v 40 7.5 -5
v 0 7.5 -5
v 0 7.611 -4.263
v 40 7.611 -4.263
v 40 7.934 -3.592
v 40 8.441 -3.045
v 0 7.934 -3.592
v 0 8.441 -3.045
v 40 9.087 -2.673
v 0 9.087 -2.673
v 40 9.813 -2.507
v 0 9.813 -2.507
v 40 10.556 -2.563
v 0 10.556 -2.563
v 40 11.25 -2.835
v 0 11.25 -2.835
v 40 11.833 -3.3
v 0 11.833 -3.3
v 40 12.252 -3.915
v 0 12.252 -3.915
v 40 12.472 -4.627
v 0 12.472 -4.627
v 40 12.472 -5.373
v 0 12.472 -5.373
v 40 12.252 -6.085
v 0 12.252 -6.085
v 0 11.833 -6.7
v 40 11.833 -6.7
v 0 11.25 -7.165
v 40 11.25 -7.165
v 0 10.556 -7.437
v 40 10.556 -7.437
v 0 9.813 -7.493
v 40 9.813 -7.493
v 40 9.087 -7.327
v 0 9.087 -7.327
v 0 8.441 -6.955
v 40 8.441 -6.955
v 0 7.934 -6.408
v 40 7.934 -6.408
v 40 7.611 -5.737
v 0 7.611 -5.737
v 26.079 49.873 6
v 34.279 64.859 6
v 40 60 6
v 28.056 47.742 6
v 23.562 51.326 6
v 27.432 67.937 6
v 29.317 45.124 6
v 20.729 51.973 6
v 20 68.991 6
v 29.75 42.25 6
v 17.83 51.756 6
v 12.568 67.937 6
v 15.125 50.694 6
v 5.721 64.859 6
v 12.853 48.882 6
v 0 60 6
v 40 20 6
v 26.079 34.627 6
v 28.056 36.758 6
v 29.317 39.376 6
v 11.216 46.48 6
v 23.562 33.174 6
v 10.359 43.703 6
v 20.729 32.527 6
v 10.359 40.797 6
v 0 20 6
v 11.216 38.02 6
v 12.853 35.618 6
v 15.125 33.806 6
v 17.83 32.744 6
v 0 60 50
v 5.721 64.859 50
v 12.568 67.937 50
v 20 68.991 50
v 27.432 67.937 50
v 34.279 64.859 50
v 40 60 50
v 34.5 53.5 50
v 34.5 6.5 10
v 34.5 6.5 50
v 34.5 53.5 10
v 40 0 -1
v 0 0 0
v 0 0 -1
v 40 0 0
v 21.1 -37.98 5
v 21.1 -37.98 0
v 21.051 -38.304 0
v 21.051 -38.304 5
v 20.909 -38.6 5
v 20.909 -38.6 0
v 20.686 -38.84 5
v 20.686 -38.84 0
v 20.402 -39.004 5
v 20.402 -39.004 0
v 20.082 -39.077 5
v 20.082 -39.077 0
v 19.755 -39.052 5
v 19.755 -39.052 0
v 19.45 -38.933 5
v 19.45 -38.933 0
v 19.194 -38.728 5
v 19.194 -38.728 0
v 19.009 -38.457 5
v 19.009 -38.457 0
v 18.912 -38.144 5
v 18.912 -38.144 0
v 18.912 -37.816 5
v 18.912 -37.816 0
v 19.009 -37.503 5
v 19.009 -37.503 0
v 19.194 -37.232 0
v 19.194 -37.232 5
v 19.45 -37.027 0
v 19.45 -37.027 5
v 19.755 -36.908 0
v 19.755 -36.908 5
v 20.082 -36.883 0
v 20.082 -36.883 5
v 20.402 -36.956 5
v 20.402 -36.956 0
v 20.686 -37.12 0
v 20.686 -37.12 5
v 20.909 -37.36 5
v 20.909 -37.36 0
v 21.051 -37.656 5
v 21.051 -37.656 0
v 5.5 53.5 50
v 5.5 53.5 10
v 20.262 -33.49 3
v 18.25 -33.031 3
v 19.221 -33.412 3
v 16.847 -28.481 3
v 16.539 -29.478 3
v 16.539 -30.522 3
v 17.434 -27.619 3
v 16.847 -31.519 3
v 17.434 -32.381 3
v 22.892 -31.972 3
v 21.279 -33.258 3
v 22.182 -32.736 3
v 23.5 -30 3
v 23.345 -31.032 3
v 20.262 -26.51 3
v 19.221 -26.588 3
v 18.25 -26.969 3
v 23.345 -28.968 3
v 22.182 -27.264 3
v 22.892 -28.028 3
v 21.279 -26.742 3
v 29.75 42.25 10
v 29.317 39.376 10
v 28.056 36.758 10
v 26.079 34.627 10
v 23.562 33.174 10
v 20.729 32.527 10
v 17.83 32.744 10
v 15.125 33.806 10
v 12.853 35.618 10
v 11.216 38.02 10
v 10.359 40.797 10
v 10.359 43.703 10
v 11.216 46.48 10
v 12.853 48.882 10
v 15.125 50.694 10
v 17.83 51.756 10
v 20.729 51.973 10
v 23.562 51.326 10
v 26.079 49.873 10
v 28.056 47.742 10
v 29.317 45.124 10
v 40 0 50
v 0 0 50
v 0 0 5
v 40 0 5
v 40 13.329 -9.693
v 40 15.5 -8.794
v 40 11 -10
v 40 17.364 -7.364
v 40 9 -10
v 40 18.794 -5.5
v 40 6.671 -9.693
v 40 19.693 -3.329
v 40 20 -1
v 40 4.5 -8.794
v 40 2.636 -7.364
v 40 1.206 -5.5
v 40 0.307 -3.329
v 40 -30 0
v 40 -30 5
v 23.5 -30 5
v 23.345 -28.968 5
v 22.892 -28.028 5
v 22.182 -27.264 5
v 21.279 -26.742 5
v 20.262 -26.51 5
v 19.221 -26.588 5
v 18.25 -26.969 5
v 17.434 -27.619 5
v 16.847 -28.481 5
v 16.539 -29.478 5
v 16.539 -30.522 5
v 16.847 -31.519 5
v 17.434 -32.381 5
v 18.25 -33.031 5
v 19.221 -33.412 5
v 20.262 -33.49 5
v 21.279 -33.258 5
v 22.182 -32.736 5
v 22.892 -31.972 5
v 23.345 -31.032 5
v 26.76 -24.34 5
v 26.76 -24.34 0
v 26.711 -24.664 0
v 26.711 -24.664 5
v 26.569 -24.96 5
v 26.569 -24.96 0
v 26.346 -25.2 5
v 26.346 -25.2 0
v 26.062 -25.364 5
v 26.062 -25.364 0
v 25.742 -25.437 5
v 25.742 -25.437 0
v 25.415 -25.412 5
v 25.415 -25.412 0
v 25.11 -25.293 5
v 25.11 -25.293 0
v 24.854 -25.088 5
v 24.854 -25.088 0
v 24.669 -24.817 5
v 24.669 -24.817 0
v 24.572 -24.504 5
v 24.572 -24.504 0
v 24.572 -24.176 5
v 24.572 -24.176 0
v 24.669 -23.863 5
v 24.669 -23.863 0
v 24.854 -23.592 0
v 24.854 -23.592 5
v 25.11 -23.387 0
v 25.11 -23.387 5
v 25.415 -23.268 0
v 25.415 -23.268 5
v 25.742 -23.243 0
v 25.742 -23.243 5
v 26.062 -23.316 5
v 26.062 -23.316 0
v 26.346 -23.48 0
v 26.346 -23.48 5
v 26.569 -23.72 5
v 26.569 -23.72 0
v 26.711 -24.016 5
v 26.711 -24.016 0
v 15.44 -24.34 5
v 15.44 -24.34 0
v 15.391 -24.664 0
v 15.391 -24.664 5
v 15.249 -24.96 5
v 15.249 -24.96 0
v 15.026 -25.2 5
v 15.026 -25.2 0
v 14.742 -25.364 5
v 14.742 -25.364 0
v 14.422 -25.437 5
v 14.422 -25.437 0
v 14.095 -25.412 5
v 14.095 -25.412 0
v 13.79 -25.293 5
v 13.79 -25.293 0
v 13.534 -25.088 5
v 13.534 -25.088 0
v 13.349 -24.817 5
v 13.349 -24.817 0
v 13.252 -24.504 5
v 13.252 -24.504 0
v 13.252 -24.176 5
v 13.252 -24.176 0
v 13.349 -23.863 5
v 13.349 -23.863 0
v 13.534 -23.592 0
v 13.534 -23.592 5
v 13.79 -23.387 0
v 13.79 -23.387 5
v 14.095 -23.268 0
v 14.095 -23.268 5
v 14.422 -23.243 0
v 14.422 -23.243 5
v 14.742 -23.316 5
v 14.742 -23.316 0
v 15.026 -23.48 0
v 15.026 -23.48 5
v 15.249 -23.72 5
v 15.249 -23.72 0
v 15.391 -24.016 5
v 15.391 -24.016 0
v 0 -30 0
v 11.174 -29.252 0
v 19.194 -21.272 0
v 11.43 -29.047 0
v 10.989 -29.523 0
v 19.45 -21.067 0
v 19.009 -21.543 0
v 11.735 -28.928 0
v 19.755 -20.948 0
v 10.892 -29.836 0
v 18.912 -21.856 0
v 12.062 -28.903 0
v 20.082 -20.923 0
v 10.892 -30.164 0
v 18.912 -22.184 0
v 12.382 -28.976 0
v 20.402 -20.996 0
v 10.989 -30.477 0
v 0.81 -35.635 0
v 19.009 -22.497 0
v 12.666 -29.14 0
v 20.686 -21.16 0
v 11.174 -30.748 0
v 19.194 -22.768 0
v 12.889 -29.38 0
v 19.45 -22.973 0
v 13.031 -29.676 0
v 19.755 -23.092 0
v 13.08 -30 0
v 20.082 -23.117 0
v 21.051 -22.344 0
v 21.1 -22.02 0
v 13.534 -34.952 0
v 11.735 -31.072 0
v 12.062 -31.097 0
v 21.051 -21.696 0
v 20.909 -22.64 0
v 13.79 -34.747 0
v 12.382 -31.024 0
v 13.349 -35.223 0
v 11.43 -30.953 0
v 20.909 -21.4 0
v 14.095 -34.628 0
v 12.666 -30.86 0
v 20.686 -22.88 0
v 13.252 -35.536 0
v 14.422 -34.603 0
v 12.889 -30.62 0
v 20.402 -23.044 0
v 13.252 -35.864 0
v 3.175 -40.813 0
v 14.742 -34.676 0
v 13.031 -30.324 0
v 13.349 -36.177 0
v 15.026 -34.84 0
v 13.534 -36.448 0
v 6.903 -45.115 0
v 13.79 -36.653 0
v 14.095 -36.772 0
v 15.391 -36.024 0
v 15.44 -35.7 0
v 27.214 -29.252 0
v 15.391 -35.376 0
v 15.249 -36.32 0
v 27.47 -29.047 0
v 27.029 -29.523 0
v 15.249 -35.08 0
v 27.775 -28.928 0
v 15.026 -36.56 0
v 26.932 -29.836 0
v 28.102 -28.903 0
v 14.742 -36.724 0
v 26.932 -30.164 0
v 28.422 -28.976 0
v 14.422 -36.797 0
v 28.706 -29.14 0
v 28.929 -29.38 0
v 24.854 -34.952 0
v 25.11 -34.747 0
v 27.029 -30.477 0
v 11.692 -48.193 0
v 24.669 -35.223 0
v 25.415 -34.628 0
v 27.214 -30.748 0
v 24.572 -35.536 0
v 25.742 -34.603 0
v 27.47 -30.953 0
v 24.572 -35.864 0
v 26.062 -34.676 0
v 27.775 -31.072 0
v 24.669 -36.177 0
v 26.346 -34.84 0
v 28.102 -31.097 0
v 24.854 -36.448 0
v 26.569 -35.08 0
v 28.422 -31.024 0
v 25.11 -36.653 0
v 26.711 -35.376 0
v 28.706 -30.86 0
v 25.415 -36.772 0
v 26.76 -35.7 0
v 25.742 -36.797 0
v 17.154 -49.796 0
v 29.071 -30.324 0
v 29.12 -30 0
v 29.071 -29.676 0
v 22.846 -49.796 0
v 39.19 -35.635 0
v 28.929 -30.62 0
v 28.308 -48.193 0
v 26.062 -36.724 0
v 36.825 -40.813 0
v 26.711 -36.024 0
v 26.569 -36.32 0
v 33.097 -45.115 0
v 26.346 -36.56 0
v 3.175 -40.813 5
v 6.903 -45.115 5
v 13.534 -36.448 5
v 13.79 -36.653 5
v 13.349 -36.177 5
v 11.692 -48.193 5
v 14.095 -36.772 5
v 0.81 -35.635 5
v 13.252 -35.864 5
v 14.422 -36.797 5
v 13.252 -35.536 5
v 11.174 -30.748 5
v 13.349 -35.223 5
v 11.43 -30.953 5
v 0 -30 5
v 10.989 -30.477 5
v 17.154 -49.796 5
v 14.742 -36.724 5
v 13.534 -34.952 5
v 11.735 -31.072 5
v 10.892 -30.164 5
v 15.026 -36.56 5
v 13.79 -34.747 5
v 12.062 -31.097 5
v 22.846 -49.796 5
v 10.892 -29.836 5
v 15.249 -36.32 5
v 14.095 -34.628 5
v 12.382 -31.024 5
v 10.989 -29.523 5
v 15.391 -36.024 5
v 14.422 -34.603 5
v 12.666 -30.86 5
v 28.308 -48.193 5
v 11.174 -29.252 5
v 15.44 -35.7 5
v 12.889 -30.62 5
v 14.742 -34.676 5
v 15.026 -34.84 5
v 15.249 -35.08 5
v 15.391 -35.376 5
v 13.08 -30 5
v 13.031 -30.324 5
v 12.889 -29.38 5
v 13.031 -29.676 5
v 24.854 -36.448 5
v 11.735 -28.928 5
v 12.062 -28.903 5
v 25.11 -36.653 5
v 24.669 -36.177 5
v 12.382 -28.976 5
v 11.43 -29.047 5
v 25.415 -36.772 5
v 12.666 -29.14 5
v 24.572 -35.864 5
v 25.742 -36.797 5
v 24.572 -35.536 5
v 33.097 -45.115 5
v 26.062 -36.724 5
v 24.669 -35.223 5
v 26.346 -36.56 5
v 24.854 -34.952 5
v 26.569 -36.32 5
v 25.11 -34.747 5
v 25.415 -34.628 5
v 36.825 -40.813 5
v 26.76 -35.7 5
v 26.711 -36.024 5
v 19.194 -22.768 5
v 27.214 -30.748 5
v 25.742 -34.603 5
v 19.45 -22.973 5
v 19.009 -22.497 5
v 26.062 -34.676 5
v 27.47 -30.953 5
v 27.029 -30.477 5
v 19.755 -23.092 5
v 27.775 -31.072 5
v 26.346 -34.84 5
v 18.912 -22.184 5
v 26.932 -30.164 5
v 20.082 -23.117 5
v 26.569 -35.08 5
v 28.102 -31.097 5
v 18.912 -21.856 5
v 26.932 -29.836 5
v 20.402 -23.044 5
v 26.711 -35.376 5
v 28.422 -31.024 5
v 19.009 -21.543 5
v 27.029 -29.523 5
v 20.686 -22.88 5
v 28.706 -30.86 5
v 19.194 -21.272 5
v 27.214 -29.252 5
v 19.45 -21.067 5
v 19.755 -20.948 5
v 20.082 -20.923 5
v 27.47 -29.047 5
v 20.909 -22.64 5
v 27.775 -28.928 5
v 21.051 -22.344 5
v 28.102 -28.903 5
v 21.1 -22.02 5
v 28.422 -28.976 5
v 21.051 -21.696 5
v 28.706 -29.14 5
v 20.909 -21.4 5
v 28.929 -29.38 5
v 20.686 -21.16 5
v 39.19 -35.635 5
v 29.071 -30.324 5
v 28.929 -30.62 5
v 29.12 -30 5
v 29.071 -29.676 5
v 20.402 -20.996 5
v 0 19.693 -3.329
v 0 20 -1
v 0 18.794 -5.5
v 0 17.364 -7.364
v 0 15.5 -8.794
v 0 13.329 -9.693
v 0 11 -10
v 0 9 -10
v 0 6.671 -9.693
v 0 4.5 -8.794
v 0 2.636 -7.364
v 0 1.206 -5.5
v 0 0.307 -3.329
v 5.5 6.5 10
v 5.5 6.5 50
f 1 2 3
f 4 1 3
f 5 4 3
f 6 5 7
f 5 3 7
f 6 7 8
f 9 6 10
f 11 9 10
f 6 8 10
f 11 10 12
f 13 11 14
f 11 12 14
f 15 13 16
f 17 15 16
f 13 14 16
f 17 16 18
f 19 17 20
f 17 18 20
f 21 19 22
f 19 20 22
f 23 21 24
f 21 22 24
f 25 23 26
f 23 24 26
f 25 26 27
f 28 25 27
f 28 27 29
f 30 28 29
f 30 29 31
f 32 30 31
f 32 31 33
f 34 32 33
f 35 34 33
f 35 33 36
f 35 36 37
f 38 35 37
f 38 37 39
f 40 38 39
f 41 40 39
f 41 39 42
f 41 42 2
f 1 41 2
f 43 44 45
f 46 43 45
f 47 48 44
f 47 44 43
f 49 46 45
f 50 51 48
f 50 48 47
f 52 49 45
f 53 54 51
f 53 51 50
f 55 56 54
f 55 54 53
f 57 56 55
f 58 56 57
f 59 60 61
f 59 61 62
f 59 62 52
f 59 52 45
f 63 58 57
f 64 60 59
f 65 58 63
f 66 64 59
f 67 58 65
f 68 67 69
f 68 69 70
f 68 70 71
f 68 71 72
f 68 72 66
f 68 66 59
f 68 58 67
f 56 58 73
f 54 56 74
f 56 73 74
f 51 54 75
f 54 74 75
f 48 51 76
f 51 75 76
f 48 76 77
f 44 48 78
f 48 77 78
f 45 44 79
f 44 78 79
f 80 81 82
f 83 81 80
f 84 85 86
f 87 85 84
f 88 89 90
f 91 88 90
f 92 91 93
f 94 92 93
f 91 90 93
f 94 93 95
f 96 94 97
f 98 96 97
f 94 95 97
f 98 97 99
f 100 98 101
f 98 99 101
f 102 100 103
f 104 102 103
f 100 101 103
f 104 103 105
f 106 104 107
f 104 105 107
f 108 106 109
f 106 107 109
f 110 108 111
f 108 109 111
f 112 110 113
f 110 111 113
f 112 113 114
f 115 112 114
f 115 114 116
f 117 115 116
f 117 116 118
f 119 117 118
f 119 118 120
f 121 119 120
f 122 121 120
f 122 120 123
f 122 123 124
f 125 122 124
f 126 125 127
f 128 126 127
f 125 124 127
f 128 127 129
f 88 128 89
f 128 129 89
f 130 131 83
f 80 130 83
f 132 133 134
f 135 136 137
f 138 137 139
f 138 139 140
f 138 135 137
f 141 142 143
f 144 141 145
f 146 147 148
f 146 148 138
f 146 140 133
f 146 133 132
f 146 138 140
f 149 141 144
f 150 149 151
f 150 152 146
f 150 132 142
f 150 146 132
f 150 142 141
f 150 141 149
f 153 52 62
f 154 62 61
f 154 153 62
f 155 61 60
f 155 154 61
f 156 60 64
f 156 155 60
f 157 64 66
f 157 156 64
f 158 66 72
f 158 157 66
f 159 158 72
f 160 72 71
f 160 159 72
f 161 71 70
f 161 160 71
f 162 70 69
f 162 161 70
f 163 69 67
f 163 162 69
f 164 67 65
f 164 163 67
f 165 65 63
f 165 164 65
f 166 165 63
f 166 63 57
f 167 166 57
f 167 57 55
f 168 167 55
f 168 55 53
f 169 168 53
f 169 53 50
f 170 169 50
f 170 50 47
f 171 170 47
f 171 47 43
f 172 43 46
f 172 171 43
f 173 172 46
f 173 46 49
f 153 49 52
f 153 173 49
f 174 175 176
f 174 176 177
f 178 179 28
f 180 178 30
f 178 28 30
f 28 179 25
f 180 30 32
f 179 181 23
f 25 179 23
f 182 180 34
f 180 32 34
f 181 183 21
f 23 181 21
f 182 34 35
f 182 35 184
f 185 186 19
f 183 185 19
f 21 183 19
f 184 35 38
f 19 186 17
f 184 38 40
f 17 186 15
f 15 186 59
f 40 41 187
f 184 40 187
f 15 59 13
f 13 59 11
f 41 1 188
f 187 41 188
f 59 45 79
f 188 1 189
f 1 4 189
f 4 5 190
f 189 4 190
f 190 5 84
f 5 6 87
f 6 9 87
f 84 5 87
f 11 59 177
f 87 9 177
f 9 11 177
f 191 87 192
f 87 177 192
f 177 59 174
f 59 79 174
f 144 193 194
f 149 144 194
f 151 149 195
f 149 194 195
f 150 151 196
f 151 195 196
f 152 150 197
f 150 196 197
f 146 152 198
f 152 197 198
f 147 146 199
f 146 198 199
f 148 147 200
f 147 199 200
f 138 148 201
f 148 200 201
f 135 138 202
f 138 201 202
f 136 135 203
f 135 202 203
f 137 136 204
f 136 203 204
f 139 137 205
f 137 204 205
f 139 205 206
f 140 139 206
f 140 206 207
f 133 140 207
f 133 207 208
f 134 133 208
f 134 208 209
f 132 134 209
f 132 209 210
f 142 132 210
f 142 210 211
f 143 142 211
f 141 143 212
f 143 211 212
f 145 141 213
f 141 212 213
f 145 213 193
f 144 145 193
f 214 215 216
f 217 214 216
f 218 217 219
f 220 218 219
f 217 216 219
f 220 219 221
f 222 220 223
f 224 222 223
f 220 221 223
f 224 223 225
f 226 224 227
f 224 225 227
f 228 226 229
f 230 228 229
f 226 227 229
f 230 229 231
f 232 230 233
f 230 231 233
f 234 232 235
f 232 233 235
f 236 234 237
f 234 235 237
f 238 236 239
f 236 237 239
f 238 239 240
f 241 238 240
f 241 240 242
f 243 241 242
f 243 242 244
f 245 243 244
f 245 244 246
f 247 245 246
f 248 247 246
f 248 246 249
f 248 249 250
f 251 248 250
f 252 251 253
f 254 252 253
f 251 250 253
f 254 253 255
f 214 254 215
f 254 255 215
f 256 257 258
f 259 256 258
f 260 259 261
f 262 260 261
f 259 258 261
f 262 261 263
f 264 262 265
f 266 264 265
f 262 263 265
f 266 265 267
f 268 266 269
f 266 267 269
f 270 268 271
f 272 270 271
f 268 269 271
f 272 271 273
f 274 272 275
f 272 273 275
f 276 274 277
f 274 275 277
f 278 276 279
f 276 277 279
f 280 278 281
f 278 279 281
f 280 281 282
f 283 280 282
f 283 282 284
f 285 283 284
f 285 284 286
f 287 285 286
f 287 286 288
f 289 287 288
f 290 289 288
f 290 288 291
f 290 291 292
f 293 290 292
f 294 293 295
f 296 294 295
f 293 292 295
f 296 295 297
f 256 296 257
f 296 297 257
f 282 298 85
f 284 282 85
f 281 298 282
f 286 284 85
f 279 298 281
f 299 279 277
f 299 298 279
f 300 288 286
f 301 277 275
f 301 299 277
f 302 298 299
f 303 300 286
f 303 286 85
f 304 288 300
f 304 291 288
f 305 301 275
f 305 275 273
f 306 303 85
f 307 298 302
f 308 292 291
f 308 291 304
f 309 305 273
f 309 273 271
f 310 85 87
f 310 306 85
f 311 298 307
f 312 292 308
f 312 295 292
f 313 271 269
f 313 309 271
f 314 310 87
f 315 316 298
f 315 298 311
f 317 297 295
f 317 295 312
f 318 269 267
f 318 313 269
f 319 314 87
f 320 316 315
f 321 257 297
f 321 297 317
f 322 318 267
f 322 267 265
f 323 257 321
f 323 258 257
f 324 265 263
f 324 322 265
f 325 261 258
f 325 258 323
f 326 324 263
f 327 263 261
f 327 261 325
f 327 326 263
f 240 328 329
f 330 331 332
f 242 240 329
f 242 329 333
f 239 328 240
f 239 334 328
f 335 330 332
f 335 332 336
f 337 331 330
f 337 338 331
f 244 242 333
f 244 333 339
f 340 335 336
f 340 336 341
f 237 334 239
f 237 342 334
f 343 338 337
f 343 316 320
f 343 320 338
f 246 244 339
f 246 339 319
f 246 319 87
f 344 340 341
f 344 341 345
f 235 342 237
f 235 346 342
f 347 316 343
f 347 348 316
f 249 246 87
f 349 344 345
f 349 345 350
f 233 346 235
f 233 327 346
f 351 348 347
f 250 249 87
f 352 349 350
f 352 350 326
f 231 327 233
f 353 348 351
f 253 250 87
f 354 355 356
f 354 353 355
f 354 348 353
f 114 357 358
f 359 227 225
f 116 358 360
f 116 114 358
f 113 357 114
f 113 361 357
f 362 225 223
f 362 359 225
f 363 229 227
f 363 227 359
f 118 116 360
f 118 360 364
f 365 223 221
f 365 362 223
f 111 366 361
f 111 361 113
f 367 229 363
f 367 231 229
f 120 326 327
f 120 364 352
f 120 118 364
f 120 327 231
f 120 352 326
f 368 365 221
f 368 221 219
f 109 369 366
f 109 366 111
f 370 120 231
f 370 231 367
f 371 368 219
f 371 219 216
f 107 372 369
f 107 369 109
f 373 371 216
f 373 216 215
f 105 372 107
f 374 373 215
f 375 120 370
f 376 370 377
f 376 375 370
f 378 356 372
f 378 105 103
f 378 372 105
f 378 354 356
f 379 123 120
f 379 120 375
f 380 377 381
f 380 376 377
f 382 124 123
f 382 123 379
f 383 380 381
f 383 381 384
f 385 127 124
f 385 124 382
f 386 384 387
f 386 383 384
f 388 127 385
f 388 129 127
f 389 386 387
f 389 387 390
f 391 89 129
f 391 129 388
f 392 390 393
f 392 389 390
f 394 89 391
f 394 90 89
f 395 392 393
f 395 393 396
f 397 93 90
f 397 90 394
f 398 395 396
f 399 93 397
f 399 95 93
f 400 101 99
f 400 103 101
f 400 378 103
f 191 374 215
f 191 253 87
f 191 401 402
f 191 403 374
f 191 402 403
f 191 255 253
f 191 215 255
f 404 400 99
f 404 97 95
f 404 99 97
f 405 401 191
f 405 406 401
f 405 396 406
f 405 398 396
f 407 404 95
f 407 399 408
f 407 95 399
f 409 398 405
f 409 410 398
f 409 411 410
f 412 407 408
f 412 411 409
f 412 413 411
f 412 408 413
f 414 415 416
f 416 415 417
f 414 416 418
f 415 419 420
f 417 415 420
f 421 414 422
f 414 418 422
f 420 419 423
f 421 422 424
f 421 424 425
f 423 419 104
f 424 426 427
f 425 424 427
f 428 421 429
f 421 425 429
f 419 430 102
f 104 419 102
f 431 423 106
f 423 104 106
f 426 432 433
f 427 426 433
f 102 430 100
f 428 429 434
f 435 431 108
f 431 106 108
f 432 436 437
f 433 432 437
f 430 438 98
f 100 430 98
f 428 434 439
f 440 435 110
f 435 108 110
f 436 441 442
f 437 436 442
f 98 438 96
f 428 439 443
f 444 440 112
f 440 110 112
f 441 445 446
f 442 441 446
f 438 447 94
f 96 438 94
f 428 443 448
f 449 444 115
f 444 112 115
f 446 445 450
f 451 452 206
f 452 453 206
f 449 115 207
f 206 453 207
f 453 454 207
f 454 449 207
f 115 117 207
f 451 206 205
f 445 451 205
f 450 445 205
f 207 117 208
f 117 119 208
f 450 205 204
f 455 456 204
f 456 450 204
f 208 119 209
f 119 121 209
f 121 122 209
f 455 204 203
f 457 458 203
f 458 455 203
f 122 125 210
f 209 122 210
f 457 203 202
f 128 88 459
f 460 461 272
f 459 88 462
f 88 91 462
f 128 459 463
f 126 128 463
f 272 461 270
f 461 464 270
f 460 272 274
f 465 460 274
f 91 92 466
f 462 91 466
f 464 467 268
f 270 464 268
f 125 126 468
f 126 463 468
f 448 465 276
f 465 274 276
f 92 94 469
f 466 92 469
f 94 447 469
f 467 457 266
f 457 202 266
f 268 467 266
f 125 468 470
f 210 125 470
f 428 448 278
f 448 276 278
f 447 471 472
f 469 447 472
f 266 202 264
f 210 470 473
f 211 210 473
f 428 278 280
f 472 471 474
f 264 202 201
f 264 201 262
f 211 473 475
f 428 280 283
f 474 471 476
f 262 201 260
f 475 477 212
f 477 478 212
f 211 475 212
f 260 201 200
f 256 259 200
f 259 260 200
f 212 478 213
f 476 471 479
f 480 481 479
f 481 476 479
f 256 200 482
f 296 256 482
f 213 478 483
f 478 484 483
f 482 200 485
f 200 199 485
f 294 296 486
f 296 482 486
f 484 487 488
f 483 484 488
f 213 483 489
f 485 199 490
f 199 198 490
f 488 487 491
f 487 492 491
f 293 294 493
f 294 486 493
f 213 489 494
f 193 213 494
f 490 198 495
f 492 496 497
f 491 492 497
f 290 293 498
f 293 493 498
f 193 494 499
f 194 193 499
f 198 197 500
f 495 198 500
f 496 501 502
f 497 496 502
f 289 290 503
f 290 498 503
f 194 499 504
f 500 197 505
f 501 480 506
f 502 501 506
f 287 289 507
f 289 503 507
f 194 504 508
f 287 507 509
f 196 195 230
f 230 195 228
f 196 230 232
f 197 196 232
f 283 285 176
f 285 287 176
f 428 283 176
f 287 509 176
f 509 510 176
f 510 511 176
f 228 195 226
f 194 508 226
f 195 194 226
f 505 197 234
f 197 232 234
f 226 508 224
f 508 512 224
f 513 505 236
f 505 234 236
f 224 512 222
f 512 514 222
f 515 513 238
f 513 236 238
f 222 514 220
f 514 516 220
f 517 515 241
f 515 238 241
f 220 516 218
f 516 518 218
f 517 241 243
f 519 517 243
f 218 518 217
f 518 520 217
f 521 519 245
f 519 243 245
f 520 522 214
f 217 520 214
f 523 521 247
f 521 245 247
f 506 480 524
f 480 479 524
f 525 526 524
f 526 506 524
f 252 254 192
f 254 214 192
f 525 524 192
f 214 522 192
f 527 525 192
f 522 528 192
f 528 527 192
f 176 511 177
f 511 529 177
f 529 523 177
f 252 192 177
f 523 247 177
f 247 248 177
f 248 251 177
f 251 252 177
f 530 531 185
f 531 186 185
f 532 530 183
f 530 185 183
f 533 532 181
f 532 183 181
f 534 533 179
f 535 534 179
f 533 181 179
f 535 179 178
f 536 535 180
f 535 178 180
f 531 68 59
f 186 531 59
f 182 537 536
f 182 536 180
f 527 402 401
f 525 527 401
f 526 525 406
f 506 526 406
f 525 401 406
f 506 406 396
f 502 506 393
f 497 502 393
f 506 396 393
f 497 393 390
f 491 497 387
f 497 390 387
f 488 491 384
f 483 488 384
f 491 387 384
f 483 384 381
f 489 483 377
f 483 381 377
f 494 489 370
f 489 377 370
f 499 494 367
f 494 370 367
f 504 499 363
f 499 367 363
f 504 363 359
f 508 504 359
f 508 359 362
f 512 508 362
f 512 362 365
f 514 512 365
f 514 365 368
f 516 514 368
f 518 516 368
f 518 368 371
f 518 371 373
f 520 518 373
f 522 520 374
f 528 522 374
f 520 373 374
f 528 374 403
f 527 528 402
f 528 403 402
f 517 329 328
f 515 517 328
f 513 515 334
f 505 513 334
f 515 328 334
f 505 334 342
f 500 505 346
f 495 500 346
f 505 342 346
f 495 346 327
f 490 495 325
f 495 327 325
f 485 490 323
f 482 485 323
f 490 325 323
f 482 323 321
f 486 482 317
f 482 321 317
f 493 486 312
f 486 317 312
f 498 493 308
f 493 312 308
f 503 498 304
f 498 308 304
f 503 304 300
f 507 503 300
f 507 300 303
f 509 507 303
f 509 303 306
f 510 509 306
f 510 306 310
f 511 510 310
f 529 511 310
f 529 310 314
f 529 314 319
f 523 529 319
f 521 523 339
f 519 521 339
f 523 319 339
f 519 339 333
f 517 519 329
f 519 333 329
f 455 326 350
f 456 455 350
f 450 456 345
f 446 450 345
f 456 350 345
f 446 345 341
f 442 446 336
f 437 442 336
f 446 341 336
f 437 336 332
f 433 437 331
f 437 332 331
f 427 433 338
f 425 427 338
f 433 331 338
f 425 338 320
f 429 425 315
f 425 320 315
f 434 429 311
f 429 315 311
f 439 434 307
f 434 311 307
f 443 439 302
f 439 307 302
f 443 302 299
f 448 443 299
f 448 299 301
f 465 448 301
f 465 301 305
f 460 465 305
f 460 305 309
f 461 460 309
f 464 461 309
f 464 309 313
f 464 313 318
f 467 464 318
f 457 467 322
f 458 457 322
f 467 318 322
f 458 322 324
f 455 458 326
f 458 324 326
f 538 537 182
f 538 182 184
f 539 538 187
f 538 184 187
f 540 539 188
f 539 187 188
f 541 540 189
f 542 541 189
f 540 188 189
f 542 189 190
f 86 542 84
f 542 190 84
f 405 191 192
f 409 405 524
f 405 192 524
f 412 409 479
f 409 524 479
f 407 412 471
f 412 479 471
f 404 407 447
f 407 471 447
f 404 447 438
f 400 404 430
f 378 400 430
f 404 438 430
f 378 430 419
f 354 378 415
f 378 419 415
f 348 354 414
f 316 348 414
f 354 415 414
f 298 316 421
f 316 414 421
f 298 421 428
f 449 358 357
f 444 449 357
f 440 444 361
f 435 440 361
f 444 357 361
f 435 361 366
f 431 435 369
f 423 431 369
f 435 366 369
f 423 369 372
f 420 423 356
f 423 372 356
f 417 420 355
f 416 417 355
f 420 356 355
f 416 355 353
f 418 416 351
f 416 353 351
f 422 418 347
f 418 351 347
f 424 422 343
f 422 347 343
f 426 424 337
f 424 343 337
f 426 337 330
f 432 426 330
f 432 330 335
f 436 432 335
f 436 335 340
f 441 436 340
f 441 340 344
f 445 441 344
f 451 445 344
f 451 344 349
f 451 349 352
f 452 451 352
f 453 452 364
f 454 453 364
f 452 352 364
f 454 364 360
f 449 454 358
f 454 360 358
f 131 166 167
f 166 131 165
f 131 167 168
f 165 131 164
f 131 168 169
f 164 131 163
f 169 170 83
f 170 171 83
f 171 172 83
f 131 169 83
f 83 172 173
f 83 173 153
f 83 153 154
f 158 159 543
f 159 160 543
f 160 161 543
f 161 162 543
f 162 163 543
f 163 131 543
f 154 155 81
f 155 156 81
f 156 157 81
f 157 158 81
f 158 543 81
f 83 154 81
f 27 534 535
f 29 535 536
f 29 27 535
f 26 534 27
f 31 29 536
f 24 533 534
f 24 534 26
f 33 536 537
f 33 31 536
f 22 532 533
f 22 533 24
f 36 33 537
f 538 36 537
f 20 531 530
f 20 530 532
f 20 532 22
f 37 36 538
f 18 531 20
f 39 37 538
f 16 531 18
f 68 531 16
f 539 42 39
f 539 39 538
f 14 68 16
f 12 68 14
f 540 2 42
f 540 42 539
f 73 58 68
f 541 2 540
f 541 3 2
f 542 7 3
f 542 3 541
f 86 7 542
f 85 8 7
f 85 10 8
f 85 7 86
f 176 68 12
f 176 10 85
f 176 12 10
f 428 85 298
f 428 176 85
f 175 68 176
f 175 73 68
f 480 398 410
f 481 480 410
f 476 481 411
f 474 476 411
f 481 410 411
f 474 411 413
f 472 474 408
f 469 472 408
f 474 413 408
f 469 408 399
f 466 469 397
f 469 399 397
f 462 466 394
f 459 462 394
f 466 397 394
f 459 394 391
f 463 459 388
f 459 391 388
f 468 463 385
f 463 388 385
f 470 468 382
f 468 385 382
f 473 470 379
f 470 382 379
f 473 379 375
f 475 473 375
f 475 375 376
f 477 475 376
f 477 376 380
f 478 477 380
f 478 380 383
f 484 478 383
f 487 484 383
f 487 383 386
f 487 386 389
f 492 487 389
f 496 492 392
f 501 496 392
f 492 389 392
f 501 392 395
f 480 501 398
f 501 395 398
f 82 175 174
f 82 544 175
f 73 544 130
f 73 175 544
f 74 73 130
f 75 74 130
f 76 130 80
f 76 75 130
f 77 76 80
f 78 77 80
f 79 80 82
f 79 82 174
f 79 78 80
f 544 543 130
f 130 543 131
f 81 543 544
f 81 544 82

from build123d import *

# Parameters (mm, degrees)
SKETCH_W        = 29
SKETCH_H        = 47
PAD_DEPTH       = 40
SKETCH001_R     = 9.75
PAD001_DEPTH    = 10
SKETCH002_W     = 56
SKETCH002_H     = 6
POCKET_DEPTH    = 100
SKETCH003_W     = 54.44
SKETCH003_H     = 5.76
POCKET001_DEPTH = 40.001
SKETCH004_R     = 1.1
POCKET002_DEPTH = 5
SKETCH005_R     = 3.5
POCKET003_DEPTH = 2
SKETCH006_W     = 40
SKETCH006_H     = 20
PAD002_DEPTH    = 10
FILLET_R        = 9
FILLET001_R     = 9
SKETCH007_R     = 2.5
POCKET004_DEPTH = 40.001


with BuildPart() as part:
    # Sketch → Pad (new body)
    with BuildSketch(Plane.XY.offset(10)):
        with BuildLine():
            Line((0, 0), (40, 0))
            Line((40, 0), (40, 60))
            ThreePointArc((40, 60), (20, 68.990653), (0, 60))
            Line((0, 60), (0, 0))
        make_face()
        with Locations((20, 30)):
            Rectangle(SKETCH_W, SKETCH_H, mode=Mode.SUBTRACT)
    extrude(amount=PAD_DEPTH)

    # Sketch001 (on Face9 of Pad) → Pad001 (join)
    with BuildSketch(Plane(origin=(0, 0, 10), x_dir=(1, 0, 0), z_dir=(0, 0, -1))):
        with BuildLine():
            Line((40, -60), (40, 30))
            ThreePointArc((40, 30), (20, 50), (0, 30))
            Line((0, 30), (0, -60))
            ThreePointArc((0, -60), (20, -68.990653), (40, -60))
        make_face()
        with Locations((20, -42.25)):
            Circle(SKETCH001_R, mode=Mode.SUBTRACT)
    extrude(amount=PAD001_DEPTH)

    # Sketch002 (on Face7 of Pad001) → Pocket (cut)
    with BuildSketch(Plane(origin=(0, 0, 0), x_dir=(0, -1, 0), z_dir=(-1, 0, 0))):
        with Locations((-48, 3)):
            Rectangle(SKETCH002_W, SKETCH002_H)
    extrude(amount=-POCKET_DEPTH, mode=Mode.SUBTRACT)

    # Sketch003 (on Face8 of Pocket) → Pocket001 (cut, through all)
    with BuildSketch(Plane.YZ.offset(40)):
        with Locations((-27.22, 7.88)):
            Rectangle(SKETCH003_W, SKETCH003_H)
    extrude(amount=-POCKET001_DEPTH, mode=Mode.SUBTRACT)

    # Sketch004 (on Face12 of Pocket001) → Pocket002 (cut)
    with BuildSketch(Plane(origin=(0, 0, 0), x_dir=(1, 0, 0), z_dir=(0, 0, -1))):
        with Locations((11.98, 30)):
            Circle(SKETCH004_R)
        with Locations((14.34, 35.7)):
            Circle(SKETCH004_R)
        with Locations((20, 37.98)):
            Circle(SKETCH004_R)
        with Locations((25.66, 35.7)):
            Circle(SKETCH004_R)
        with Locations((28.02, 30)):
            Circle(SKETCH004_R)
        with Locations((25.66, 24.34)):
            Circle(SKETCH004_R)
        with Locations((20, 22.02)):
            Circle(SKETCH004_R)
        with Locations((14.34, 24.34)):
            Circle(SKETCH004_R)
    extrude(amount=-POCKET002_DEPTH, mode=Mode.SUBTRACT)

    # Sketch005 (on Face7 of Pocket002) → Pocket003 (cut)
    with BuildSketch(Plane.XY.offset(5)):
        with Locations((20, -30)):
            Circle(SKETCH005_R)
    extrude(amount=-POCKET003_DEPTH, mode=Mode.SUBTRACT)

    # Sketch006 (on Face12 of Pocket003) → Pad002 (join)
    with BuildSketch(Plane(origin=(0, 0, 0), x_dir=(1, 0, 0), z_dir=(0, 0, -1))):
        with Locations((20, -10)):
            Rectangle(SKETCH006_W, SKETCH006_H)
    extrude(amount=PAD002_DEPTH)

    # Fillet
    fillet_edges = [part.edges().sort_by_distance(p)[0] for p in [
        (20, 20, -10),
    ]]
    fillet(fillet_edges, radius=FILLET_R)

    # Fillet001
    fillet001_edges = [part.edges().sort_by_distance(p)[0] for p in [
        (20, 0, -10),
    ]]
    fillet(fillet001_edges, radius=FILLET001_R)

    # Sketch007 (on Face8 of Fillet001) → Pocket004 (cut, through all)
    with BuildSketch(Plane(origin=(0, 0, 0), x_dir=(0, -1, 0), z_dir=(-1, 0, 0))):
        with Locations((-10, -5)):
            Circle(SKETCH007_R)
    extrude(amount=-POCKET004_DEPTH, mode=Mode.SUBTRACT)


solid = part.part
